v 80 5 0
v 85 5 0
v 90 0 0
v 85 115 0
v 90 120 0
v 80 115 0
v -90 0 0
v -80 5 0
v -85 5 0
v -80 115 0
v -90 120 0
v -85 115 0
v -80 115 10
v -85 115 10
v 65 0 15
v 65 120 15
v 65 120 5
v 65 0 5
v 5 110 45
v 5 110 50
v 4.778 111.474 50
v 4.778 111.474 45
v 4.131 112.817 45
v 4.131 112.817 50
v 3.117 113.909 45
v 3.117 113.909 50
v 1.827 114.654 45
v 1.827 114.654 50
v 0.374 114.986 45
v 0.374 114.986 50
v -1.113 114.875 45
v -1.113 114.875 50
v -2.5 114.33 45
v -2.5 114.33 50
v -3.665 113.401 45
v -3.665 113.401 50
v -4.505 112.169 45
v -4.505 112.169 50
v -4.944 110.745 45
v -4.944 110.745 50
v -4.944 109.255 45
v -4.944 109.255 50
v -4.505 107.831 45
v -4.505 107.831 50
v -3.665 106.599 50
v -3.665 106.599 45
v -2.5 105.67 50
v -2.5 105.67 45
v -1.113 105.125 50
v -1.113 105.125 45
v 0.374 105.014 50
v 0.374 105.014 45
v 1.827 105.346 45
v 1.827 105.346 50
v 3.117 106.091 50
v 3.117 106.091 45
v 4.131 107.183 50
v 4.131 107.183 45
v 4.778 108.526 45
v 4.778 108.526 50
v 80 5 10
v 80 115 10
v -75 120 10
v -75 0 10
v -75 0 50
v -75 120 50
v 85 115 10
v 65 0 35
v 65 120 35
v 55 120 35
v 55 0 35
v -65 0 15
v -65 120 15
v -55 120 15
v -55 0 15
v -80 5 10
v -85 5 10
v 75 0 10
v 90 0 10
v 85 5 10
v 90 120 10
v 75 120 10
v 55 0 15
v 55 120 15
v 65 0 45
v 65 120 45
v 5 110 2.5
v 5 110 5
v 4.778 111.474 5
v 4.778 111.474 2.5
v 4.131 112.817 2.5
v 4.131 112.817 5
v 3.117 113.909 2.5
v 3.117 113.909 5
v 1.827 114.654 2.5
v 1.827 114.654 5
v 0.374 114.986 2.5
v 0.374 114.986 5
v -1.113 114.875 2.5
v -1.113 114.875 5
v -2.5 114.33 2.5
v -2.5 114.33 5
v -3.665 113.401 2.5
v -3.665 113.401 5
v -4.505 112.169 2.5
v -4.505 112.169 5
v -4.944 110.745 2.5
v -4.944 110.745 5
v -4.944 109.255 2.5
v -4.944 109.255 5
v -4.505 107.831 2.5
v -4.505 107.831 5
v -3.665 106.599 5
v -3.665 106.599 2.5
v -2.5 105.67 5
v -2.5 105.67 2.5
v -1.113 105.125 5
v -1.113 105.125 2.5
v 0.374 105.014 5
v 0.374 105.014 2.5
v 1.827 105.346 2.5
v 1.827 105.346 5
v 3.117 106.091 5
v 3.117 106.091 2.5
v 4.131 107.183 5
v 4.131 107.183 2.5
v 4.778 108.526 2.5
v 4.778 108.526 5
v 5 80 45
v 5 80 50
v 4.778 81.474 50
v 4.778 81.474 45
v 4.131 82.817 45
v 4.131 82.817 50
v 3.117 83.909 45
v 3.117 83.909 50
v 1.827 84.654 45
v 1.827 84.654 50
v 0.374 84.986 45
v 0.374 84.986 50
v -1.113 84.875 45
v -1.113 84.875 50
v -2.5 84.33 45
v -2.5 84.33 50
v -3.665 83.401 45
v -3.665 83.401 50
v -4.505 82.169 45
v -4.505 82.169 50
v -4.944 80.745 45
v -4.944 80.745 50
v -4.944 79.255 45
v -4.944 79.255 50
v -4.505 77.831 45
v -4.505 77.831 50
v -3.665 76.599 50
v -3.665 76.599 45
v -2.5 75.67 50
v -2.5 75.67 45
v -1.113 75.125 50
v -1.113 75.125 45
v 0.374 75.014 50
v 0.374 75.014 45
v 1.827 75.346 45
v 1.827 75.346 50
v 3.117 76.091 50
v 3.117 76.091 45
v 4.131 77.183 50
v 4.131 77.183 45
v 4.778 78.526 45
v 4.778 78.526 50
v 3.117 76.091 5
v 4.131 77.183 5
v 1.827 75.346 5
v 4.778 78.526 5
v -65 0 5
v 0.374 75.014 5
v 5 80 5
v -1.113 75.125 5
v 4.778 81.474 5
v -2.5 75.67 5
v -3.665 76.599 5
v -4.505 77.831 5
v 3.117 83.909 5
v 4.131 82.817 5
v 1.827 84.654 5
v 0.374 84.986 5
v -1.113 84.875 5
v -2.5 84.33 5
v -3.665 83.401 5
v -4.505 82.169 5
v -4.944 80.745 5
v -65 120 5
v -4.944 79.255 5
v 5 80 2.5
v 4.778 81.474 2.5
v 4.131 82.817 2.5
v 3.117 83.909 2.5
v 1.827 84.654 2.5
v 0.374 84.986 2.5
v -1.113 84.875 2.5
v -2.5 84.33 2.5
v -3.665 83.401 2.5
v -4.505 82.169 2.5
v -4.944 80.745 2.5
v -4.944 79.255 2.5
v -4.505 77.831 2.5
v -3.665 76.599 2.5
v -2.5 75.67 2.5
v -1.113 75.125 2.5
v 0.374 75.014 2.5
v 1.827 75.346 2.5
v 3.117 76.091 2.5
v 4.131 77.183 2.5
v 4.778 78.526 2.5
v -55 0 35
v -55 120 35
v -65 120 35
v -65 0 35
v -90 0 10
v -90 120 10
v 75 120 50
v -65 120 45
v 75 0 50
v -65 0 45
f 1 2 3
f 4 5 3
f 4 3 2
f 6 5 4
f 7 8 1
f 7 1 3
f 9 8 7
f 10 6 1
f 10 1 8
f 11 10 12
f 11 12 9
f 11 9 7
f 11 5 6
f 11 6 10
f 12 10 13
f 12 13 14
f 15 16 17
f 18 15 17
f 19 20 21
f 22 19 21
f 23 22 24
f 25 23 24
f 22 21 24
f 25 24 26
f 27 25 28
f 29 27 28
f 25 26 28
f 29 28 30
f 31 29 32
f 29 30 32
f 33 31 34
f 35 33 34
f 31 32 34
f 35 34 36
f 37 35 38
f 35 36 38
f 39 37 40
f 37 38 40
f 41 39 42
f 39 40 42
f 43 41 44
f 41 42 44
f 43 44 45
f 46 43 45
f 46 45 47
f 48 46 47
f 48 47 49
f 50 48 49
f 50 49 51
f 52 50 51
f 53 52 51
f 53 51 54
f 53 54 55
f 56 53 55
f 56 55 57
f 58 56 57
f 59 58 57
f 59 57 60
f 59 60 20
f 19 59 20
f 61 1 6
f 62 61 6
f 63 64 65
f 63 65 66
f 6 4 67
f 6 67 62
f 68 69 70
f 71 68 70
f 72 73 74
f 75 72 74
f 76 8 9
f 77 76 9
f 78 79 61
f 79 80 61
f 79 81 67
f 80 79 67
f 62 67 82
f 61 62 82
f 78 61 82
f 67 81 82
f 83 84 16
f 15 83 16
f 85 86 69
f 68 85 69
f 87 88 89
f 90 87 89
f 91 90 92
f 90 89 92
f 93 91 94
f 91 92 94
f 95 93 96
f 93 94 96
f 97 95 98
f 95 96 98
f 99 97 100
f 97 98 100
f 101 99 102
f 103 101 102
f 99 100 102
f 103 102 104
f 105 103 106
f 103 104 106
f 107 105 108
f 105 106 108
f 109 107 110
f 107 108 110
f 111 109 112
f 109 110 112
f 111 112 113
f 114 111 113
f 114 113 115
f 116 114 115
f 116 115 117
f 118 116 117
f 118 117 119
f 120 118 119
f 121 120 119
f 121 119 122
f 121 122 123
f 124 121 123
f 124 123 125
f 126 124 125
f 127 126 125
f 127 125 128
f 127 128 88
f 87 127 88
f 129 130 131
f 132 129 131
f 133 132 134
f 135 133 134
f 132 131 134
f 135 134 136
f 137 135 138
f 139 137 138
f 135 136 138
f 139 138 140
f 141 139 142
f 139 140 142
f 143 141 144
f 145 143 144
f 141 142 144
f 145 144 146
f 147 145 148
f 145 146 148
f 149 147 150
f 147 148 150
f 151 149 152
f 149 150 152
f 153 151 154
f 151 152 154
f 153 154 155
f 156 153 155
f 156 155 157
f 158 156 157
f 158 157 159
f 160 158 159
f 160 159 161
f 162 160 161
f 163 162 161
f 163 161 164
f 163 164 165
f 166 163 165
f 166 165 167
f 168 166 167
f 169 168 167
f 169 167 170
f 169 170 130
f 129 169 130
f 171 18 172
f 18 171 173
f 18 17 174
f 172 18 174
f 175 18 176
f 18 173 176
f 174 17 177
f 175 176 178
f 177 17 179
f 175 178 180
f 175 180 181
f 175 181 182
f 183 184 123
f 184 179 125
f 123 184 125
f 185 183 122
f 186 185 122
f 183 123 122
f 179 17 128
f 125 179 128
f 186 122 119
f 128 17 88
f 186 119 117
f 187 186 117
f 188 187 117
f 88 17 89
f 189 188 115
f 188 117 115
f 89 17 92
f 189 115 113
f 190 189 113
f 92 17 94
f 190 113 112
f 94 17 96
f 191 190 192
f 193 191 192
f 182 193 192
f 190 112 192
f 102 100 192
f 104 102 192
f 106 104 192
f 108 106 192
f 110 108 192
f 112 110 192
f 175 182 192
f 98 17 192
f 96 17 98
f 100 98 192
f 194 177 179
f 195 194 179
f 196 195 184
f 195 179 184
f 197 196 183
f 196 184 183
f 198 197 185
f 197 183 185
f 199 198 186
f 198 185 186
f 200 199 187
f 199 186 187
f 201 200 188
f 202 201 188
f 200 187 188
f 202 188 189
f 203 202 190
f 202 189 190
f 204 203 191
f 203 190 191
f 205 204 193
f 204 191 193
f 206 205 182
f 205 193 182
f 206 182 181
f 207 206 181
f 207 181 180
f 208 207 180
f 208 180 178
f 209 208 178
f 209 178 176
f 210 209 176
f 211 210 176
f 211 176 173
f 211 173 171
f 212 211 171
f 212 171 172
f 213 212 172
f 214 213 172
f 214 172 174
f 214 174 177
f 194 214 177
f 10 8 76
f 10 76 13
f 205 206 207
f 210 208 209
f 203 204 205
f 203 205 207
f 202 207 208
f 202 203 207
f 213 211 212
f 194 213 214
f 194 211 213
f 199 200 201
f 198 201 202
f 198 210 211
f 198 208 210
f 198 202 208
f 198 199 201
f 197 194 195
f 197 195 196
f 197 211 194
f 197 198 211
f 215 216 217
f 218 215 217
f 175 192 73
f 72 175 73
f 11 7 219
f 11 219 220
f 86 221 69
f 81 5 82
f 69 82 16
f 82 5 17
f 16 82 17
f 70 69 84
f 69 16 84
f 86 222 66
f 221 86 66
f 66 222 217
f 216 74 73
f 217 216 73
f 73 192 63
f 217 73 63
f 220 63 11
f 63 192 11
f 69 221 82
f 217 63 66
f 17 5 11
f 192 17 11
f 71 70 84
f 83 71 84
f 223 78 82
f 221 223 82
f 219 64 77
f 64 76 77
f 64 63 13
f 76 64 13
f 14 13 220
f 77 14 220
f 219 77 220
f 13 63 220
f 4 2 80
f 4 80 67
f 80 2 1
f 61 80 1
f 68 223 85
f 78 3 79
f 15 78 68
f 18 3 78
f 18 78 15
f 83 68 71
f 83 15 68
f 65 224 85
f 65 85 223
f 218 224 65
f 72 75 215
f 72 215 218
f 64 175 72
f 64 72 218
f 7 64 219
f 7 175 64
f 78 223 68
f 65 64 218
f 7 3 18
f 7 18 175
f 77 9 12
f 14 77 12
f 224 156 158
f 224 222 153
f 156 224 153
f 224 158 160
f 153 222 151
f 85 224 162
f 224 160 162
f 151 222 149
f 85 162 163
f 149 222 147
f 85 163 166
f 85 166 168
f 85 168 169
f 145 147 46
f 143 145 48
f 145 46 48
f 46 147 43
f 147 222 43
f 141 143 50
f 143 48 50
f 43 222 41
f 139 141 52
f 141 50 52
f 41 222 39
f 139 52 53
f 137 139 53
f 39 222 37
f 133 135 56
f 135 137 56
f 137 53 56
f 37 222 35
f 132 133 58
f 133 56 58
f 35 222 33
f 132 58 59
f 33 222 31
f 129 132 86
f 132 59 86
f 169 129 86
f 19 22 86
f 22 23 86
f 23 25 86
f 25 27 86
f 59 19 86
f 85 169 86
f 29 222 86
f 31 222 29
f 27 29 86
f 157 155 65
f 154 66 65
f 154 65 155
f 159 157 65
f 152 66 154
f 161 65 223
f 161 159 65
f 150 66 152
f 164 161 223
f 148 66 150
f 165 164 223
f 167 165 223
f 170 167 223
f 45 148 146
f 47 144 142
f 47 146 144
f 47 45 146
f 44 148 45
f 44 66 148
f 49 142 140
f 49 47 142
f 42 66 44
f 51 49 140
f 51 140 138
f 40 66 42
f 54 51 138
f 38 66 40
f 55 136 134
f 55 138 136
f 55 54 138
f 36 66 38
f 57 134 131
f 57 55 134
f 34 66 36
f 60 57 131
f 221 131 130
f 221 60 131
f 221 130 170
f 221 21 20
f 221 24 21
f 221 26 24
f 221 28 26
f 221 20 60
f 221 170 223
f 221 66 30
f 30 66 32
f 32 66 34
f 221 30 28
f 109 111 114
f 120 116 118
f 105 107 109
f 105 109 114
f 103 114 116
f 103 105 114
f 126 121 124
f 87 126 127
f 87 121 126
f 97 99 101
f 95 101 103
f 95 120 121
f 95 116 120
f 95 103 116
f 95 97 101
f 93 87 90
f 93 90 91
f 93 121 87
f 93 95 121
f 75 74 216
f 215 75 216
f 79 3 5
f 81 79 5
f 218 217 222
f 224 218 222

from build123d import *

# Parameters (mm, degrees)
SKETCH1_W           = 150
SKETCH1_H           = 120
BODY_DEPTH          = 50
SPINE_SOCKET_DEPTH  = 151.083310198
SKETCH3_R           = 5
CUT_EXTRUDE2_DEPTH  = 47.5
SKETCH4_W           = 15
SKETCH4_H           = 120
SKETCH4_W_2         = 5
SKETCH4_H_2         = 110
BOSS_EXTRUDE2_DEPTH = 10


with BuildPart() as part:
    # Sketch1 → body (new body)
    with BuildSketch(Plane.XY):
        with Locations((0, 60)):
            Rectangle(SKETCH1_W, SKETCH1_H)
    extrude(amount=BODY_DEPTH)

    # Sketch2 → spine socket (cut, through all)
    with BuildSketch(Plane(origin=(0, 120, 0), x_dir=(1, 0, 0), z_dir=(0, 1, 0))):
        Polygon((-65, -5), (-65, -15), (-55, -15), (-55, -35), (-65, -35), (-65, -45), (65, -45), (65, -35), (55, -35), (55, -15), (65, -15), (65, -5), align=None)
    extrude(amount=-SPINE_SOCKET_DEPTH, mode=Mode.SUBTRACT)

    # Sketch3 → Cut-Extrude2 (cut)
    with BuildSketch(Plane.XY.offset(50)):
        with Locations((0, 110)):
            Circle(SKETCH3_R)
        with Locations((0, 80)):
            Circle(SKETCH3_R)
    extrude(amount=-CUT_EXTRUDE2_DEPTH, mode=Mode.SUBTRACT)

    # Sketch4 → Boss-Extrude2 (add)
    # profile 1 of 2: a face of its own
    with BuildSketch(Plane(origin=(0, 0, 0), x_dir=(-1, 0, 0), z_dir=(0, 0, -1))):
        with Locations((-82.5, 60)):
            Rectangle(SKETCH4_W, SKETCH4_H)
        with Locations((-82.5, 60)):
            Rectangle(SKETCH4_W_2, SKETCH4_H_2, mode=Mode.SUBTRACT)
    # profile 2 of 2: a face of its own
    with BuildSketch(Plane(origin=(0, 0, 0), x_dir=(-1, 0, 0), z_dir=(0, 0, -1))):
        with Locations((82.5, 60)):
            Rectangle(SKETCH4_W, SKETCH4_H)
        with Locations((82.5, 60)):
            Rectangle(SKETCH4_W_2, SKETCH4_H_2, mode=Mode.SUBTRACT)
    extrude(amount=-BOSS_EXTRUDE2_DEPTH)


solid = part.part
